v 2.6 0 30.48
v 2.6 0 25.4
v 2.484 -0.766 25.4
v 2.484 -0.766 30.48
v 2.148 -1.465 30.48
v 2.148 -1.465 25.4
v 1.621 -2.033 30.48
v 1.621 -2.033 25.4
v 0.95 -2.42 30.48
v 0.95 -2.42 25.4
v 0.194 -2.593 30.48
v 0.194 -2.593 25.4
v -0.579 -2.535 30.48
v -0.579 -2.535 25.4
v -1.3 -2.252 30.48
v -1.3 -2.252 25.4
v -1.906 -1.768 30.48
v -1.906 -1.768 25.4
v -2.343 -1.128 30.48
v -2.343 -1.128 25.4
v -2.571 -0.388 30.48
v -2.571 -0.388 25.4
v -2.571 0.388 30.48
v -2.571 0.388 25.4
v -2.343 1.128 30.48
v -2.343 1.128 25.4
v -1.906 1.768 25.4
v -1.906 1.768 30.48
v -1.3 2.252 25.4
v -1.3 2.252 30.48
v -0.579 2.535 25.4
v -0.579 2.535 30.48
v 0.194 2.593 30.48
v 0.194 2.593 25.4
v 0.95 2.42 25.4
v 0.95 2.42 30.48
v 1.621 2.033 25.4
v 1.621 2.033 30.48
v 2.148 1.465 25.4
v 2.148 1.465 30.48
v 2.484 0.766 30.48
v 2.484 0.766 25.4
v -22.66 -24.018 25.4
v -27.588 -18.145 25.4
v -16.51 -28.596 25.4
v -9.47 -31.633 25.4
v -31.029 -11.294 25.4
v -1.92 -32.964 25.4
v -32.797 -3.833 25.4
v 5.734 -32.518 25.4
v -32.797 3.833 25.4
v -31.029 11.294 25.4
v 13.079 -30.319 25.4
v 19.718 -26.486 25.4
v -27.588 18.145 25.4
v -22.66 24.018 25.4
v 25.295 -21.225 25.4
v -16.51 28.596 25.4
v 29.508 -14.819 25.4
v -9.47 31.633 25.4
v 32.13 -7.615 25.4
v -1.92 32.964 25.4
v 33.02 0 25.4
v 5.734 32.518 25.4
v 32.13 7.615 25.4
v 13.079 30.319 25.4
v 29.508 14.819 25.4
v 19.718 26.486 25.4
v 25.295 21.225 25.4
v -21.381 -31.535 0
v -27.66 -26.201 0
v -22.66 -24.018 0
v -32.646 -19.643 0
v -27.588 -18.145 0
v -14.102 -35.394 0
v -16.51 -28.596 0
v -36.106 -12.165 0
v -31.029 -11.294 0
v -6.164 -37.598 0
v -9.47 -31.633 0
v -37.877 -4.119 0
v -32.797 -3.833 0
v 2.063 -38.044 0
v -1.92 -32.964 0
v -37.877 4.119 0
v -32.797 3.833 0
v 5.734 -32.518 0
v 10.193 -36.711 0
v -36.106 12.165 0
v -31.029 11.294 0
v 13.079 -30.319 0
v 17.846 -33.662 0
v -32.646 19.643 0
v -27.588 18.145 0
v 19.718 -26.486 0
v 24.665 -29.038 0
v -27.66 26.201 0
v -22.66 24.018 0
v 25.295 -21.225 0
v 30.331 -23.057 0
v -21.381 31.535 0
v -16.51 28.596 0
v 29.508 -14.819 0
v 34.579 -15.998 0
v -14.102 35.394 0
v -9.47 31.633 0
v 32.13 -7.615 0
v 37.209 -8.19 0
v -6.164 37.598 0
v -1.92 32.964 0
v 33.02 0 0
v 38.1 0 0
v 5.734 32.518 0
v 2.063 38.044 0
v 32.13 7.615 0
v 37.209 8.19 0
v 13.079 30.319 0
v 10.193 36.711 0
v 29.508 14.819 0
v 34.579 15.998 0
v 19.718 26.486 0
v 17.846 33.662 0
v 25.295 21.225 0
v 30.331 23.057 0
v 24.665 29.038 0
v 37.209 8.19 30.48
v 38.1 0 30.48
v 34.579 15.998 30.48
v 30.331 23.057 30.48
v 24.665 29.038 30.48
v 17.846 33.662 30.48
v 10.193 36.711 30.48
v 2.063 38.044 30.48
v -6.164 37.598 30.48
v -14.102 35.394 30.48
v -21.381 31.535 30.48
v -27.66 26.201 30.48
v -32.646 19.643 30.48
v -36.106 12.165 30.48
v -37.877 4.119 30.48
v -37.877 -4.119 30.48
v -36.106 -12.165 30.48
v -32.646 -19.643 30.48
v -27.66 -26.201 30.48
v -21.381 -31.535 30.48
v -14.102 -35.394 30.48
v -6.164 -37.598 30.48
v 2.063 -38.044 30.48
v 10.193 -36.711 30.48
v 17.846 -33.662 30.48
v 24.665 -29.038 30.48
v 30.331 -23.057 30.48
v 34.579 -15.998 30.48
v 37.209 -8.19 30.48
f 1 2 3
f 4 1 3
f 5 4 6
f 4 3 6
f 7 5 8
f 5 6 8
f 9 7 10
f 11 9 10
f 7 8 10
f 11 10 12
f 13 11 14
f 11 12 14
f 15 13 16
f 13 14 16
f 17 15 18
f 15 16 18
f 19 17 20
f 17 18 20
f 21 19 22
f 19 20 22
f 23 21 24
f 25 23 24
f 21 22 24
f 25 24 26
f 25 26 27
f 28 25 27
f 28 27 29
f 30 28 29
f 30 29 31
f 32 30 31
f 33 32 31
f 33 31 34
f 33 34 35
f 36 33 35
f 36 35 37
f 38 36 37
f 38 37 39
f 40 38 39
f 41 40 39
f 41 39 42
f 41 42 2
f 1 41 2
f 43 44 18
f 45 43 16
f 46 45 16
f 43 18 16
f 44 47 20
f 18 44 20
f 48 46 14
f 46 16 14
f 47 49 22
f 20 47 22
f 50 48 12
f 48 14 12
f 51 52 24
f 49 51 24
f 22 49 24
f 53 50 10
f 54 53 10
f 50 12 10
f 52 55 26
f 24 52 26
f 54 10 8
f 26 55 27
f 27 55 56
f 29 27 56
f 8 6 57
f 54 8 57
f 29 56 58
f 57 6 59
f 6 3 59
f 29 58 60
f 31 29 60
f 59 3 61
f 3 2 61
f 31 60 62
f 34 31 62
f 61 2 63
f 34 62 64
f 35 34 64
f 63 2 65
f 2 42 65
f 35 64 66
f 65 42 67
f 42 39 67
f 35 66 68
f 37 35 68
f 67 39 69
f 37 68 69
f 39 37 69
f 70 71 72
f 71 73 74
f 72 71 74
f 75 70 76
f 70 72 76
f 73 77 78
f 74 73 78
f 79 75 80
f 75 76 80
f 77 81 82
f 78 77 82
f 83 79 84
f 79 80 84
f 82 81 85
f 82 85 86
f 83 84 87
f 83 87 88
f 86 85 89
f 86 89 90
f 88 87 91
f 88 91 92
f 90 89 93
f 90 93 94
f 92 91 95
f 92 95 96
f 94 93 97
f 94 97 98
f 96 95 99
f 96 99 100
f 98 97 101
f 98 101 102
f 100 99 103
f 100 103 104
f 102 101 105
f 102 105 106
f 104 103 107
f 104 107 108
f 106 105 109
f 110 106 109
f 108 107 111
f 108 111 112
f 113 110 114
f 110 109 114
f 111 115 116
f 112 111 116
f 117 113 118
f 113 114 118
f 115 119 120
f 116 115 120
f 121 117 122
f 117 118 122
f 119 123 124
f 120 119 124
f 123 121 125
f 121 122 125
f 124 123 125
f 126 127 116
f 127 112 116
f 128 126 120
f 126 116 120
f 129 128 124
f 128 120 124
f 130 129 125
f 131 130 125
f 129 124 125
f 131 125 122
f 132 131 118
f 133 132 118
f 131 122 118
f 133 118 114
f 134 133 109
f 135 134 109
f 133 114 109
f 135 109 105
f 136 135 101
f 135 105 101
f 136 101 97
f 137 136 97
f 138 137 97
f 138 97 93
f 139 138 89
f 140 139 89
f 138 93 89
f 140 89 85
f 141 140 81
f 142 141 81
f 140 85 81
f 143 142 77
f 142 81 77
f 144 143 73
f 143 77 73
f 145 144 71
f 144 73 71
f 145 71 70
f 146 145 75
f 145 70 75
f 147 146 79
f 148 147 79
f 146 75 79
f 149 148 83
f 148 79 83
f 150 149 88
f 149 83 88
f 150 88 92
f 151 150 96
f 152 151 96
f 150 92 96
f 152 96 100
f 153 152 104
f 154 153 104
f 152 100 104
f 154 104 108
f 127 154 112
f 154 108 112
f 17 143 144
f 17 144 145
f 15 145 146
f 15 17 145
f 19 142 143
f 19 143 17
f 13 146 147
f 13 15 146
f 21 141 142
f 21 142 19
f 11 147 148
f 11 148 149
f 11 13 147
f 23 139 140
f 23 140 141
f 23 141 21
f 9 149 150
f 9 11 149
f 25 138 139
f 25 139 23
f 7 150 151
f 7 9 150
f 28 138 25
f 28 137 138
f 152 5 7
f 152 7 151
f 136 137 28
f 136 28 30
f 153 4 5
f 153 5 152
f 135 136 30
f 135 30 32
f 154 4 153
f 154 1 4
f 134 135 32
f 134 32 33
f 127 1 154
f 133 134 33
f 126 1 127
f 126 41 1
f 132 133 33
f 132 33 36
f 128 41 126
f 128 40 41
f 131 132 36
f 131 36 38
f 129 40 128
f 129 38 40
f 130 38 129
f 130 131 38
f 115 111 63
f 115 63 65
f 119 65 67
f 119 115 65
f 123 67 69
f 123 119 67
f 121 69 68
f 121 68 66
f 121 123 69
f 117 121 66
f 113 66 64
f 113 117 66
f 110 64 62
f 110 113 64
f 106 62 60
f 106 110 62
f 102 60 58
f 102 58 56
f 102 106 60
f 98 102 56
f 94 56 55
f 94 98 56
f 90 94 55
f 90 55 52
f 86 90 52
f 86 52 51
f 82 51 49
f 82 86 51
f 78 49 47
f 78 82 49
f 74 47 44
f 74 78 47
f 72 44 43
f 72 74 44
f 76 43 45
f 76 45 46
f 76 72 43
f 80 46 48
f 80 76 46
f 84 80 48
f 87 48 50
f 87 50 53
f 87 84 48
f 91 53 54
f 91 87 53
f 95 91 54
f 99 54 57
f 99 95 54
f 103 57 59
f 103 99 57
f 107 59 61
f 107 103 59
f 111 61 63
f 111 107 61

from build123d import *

# Parameters (mm, degrees)
F0_R     = 38.1
F0_R_2   = 33.02
F1_DEPTH = 25.4
F2_R     = 38.1
F3_DEPTH = 5.08
F4_R     = 2.599995
F5_DEPTH = 228.6


with BuildPart() as f1:
    # F0 (on Top) → F1 (new body)
    with BuildSketch(Plane.XY):
        Circle(F0_R)
        Circle(F0_R_2, mode=Mode.SUBTRACT)
    extrude(amount=F1_DEPTH)

    # F2 (on face) → F3 (join)
    with BuildSketch(Plane.XY.offset(25.4)):
        Circle(F2_R)
    extrude(amount=F3_DEPTH)

    # F4 (on face) → F5 (cut)
    with BuildSketch(Plane(origin=(0, 0, 25.4), x_dir=(1, 0, 0), z_dir=(0, 0, -1))):
        Circle(F4_R)
    extrude(amount=-F5_DEPTH, mode=Mode.SUBTRACT)


solid = f1.part
